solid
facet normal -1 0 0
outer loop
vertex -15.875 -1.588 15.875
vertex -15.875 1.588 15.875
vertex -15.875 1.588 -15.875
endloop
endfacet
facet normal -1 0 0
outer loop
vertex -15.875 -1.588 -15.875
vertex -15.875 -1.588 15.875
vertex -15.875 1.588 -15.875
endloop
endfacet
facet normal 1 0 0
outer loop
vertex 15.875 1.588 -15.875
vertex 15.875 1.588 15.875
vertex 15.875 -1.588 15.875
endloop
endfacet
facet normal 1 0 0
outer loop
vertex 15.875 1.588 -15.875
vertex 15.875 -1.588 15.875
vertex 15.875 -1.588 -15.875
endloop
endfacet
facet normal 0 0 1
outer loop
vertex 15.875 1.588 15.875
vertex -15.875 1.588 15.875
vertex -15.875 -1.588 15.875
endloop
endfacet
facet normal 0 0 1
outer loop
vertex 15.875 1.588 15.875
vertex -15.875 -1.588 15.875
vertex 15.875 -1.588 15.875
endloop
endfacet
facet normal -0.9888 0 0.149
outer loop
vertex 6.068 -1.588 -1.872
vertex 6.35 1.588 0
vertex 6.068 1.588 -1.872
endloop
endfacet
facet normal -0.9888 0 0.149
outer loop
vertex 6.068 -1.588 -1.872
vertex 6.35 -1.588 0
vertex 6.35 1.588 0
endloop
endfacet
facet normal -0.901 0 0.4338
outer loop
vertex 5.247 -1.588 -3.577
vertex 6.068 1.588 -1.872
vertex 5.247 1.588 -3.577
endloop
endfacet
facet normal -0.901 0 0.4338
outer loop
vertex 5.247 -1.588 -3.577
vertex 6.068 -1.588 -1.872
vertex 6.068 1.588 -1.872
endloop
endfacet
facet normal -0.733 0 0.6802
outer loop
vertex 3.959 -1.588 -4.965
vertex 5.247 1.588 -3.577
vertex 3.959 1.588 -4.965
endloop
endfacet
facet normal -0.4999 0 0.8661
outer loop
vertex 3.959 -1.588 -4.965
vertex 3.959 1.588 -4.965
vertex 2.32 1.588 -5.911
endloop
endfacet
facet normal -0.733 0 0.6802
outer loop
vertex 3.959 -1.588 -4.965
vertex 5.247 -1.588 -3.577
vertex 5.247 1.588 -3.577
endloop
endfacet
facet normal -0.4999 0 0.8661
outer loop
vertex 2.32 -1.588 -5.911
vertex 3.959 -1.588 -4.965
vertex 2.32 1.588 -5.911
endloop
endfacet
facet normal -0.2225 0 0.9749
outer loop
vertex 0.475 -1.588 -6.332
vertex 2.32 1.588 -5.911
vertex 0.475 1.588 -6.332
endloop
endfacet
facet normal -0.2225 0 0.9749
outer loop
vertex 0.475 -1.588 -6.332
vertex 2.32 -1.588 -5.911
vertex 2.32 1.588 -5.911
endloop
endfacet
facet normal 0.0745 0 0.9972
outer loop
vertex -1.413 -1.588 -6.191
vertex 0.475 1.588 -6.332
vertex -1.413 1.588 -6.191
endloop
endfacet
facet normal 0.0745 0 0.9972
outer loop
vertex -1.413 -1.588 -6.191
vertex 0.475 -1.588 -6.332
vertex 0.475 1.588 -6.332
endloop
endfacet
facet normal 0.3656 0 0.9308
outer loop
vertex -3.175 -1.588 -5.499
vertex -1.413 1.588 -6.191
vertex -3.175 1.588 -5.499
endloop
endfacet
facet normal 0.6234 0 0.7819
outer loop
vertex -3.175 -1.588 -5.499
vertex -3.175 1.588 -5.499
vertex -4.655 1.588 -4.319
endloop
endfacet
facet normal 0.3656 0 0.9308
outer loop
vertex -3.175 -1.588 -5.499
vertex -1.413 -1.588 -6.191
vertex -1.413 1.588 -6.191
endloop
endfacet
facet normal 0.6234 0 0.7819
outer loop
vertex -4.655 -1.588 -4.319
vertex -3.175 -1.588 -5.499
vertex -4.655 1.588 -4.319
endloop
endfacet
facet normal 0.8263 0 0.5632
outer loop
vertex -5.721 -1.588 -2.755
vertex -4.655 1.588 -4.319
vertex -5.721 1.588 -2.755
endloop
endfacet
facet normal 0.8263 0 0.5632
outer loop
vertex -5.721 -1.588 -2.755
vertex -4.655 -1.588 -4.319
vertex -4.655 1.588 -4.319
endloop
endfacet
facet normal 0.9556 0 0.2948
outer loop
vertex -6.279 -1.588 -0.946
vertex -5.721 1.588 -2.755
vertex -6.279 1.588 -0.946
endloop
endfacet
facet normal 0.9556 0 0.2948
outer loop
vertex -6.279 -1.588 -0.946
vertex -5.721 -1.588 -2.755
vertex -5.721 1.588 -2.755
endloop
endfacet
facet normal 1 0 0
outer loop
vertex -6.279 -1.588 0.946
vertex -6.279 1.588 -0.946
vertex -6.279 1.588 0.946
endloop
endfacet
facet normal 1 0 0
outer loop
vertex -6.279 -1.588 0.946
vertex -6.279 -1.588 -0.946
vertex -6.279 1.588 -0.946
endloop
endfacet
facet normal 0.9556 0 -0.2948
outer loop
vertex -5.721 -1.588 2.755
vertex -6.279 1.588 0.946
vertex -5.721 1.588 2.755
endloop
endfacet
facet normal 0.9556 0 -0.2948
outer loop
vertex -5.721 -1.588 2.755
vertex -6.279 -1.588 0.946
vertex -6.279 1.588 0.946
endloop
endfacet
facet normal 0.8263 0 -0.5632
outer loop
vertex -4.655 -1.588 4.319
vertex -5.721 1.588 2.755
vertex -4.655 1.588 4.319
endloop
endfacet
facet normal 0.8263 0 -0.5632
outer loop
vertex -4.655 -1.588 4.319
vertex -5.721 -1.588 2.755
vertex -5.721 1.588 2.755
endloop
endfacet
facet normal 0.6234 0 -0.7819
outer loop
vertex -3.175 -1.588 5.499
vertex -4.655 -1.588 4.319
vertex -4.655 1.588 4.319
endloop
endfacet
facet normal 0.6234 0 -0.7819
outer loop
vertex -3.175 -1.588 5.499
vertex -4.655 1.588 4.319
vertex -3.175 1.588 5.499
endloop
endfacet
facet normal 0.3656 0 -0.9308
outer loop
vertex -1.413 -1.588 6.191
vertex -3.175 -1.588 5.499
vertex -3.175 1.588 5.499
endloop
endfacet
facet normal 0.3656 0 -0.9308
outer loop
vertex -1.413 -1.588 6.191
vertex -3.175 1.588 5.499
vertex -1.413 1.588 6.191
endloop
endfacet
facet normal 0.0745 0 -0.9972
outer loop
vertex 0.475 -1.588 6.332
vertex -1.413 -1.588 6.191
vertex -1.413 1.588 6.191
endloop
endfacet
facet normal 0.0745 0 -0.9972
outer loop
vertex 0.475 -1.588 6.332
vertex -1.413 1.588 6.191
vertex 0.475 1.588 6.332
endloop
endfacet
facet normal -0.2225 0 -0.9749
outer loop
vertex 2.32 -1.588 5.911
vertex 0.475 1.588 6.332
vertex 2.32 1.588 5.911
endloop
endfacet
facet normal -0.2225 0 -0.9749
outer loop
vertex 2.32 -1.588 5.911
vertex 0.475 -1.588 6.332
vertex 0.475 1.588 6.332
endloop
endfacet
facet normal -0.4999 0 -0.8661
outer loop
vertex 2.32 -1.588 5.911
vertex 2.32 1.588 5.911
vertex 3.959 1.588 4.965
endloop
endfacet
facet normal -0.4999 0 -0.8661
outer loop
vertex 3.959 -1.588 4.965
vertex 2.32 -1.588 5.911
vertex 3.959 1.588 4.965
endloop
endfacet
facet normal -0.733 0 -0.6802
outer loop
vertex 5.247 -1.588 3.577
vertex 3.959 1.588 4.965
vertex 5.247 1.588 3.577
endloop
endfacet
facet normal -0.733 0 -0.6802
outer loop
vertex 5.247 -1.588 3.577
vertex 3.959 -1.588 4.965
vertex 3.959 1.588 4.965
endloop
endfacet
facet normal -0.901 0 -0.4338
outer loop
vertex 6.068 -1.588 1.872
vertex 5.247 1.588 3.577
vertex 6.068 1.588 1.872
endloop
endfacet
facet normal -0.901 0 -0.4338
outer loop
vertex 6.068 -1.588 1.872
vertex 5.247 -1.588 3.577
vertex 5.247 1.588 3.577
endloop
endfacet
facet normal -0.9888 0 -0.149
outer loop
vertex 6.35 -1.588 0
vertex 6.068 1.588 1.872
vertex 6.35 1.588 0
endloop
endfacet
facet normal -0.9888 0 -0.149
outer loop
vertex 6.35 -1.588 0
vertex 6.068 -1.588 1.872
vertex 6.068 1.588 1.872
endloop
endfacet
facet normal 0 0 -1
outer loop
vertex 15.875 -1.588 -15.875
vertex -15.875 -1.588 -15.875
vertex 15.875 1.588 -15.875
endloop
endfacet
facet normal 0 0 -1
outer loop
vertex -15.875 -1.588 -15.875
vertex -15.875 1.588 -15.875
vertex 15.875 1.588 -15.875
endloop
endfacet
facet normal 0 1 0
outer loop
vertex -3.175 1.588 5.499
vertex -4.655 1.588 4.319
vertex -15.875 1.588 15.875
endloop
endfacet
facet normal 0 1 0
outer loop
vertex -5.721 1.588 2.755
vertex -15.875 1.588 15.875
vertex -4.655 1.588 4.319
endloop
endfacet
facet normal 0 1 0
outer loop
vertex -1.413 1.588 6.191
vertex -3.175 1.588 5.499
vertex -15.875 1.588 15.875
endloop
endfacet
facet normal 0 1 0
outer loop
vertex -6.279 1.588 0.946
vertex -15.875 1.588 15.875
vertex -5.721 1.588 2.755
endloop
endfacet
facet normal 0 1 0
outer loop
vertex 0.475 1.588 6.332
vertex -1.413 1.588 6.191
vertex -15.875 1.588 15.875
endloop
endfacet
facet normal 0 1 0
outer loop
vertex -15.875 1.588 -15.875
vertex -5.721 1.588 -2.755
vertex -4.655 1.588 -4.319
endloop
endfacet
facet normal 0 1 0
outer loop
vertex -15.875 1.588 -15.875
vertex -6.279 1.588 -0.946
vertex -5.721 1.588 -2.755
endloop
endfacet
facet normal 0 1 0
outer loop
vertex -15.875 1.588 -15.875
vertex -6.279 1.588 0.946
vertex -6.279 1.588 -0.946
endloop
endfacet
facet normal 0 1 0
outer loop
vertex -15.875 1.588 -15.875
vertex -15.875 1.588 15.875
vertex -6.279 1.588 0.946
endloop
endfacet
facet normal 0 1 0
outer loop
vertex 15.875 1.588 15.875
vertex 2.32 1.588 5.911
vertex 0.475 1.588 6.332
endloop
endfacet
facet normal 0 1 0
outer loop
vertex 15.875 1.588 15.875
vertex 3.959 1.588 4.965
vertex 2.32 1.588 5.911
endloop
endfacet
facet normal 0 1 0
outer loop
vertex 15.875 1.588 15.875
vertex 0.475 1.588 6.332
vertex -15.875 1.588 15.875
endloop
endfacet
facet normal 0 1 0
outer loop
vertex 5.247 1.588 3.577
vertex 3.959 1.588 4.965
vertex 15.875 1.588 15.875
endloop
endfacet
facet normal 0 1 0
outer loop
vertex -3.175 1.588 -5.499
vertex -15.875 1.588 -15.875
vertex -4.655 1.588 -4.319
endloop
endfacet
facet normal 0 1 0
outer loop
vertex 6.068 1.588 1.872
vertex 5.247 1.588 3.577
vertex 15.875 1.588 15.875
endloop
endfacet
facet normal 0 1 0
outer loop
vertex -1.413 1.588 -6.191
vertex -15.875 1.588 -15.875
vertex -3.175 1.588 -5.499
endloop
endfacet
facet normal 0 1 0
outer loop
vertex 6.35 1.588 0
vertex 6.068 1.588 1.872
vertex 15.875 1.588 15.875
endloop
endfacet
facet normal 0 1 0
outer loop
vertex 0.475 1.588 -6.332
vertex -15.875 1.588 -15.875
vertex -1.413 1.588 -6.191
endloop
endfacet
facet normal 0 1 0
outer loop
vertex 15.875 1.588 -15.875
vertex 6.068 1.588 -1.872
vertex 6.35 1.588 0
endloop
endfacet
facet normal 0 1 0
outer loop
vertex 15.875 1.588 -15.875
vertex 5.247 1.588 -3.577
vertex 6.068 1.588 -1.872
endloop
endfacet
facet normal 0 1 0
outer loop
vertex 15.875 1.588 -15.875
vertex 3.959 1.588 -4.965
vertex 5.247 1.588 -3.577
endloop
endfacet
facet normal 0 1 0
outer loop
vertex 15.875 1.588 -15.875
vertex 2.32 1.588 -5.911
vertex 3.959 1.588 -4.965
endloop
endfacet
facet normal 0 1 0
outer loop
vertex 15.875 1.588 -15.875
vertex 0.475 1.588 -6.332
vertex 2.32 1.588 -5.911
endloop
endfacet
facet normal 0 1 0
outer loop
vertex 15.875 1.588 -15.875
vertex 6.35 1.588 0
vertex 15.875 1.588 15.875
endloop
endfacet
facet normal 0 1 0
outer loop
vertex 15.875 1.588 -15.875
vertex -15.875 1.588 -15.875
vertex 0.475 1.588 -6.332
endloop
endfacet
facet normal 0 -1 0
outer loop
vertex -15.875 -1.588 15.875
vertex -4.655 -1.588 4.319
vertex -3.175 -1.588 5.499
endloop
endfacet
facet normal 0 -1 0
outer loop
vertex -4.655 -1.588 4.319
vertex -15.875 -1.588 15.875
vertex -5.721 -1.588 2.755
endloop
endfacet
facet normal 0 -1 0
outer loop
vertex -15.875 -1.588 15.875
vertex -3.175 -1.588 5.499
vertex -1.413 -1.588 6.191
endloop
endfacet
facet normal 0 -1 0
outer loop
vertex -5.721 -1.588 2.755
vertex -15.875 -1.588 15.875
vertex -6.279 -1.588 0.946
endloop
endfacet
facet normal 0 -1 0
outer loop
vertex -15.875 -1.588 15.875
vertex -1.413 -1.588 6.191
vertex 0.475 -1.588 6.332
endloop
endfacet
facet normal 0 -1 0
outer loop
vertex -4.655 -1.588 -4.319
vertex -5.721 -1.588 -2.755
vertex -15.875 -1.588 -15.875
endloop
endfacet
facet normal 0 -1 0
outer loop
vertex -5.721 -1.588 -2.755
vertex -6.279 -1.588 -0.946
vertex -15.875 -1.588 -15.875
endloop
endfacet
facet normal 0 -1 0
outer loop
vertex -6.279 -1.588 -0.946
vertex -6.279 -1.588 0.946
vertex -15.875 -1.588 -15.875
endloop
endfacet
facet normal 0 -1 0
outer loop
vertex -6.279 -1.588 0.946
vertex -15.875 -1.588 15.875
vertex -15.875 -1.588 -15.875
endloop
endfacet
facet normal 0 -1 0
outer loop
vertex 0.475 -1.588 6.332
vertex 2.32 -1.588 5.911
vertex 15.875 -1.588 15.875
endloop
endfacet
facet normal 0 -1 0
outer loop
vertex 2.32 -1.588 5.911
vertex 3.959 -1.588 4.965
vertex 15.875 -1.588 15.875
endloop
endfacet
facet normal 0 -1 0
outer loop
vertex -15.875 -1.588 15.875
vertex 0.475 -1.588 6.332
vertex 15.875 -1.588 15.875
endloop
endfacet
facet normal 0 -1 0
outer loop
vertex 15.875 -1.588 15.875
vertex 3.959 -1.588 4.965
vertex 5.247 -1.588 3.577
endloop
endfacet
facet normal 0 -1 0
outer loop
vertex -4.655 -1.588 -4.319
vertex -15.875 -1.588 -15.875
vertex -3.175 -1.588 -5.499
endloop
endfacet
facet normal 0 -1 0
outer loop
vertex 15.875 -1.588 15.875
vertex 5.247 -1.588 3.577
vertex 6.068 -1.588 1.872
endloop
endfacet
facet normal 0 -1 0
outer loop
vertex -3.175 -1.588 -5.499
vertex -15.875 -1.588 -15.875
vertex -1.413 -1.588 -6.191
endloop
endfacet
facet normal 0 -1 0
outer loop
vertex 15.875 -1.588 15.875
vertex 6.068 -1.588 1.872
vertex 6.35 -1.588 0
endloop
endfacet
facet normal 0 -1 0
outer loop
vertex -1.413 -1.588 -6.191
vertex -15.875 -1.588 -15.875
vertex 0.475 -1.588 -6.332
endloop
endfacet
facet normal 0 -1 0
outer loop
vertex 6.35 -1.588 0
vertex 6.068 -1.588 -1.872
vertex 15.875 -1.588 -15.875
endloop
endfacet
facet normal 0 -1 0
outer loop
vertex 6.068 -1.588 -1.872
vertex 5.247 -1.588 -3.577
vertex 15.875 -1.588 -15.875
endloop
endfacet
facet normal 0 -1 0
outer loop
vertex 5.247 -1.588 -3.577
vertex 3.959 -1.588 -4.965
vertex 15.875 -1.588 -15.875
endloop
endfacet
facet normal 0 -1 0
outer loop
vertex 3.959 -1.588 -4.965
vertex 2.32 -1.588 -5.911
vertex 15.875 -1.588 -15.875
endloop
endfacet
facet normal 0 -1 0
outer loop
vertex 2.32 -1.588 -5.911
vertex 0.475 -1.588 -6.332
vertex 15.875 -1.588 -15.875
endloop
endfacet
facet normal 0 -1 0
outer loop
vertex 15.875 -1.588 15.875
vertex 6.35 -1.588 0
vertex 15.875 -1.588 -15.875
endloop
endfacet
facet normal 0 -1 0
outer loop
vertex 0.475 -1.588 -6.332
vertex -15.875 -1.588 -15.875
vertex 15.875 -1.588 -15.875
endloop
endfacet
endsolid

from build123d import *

# Parameters (mm, degrees)
SKETCH1_W           = 31.75
SKETCH1_H           = 31.75
SKETCH1_R           = 6.35
BOSS_EXTRUDE1_DEPTH = 1.5875


with BuildPart() as part:
    # Sketch1 → Boss-Extrude1 (new body, symmetric)
    with BuildSketch(Plane(origin=(0, 0, 0), x_dir=(1, 0, 0), z_dir=(0, 1, 0))):
        Rectangle(SKETCH1_W, SKETCH1_H)
        Circle(SKETCH1_R, mode=Mode.SUBTRACT)
    extrude(amount=BOSS_EXTRUDE1_DEPTH, both=True)


solid = part.part
